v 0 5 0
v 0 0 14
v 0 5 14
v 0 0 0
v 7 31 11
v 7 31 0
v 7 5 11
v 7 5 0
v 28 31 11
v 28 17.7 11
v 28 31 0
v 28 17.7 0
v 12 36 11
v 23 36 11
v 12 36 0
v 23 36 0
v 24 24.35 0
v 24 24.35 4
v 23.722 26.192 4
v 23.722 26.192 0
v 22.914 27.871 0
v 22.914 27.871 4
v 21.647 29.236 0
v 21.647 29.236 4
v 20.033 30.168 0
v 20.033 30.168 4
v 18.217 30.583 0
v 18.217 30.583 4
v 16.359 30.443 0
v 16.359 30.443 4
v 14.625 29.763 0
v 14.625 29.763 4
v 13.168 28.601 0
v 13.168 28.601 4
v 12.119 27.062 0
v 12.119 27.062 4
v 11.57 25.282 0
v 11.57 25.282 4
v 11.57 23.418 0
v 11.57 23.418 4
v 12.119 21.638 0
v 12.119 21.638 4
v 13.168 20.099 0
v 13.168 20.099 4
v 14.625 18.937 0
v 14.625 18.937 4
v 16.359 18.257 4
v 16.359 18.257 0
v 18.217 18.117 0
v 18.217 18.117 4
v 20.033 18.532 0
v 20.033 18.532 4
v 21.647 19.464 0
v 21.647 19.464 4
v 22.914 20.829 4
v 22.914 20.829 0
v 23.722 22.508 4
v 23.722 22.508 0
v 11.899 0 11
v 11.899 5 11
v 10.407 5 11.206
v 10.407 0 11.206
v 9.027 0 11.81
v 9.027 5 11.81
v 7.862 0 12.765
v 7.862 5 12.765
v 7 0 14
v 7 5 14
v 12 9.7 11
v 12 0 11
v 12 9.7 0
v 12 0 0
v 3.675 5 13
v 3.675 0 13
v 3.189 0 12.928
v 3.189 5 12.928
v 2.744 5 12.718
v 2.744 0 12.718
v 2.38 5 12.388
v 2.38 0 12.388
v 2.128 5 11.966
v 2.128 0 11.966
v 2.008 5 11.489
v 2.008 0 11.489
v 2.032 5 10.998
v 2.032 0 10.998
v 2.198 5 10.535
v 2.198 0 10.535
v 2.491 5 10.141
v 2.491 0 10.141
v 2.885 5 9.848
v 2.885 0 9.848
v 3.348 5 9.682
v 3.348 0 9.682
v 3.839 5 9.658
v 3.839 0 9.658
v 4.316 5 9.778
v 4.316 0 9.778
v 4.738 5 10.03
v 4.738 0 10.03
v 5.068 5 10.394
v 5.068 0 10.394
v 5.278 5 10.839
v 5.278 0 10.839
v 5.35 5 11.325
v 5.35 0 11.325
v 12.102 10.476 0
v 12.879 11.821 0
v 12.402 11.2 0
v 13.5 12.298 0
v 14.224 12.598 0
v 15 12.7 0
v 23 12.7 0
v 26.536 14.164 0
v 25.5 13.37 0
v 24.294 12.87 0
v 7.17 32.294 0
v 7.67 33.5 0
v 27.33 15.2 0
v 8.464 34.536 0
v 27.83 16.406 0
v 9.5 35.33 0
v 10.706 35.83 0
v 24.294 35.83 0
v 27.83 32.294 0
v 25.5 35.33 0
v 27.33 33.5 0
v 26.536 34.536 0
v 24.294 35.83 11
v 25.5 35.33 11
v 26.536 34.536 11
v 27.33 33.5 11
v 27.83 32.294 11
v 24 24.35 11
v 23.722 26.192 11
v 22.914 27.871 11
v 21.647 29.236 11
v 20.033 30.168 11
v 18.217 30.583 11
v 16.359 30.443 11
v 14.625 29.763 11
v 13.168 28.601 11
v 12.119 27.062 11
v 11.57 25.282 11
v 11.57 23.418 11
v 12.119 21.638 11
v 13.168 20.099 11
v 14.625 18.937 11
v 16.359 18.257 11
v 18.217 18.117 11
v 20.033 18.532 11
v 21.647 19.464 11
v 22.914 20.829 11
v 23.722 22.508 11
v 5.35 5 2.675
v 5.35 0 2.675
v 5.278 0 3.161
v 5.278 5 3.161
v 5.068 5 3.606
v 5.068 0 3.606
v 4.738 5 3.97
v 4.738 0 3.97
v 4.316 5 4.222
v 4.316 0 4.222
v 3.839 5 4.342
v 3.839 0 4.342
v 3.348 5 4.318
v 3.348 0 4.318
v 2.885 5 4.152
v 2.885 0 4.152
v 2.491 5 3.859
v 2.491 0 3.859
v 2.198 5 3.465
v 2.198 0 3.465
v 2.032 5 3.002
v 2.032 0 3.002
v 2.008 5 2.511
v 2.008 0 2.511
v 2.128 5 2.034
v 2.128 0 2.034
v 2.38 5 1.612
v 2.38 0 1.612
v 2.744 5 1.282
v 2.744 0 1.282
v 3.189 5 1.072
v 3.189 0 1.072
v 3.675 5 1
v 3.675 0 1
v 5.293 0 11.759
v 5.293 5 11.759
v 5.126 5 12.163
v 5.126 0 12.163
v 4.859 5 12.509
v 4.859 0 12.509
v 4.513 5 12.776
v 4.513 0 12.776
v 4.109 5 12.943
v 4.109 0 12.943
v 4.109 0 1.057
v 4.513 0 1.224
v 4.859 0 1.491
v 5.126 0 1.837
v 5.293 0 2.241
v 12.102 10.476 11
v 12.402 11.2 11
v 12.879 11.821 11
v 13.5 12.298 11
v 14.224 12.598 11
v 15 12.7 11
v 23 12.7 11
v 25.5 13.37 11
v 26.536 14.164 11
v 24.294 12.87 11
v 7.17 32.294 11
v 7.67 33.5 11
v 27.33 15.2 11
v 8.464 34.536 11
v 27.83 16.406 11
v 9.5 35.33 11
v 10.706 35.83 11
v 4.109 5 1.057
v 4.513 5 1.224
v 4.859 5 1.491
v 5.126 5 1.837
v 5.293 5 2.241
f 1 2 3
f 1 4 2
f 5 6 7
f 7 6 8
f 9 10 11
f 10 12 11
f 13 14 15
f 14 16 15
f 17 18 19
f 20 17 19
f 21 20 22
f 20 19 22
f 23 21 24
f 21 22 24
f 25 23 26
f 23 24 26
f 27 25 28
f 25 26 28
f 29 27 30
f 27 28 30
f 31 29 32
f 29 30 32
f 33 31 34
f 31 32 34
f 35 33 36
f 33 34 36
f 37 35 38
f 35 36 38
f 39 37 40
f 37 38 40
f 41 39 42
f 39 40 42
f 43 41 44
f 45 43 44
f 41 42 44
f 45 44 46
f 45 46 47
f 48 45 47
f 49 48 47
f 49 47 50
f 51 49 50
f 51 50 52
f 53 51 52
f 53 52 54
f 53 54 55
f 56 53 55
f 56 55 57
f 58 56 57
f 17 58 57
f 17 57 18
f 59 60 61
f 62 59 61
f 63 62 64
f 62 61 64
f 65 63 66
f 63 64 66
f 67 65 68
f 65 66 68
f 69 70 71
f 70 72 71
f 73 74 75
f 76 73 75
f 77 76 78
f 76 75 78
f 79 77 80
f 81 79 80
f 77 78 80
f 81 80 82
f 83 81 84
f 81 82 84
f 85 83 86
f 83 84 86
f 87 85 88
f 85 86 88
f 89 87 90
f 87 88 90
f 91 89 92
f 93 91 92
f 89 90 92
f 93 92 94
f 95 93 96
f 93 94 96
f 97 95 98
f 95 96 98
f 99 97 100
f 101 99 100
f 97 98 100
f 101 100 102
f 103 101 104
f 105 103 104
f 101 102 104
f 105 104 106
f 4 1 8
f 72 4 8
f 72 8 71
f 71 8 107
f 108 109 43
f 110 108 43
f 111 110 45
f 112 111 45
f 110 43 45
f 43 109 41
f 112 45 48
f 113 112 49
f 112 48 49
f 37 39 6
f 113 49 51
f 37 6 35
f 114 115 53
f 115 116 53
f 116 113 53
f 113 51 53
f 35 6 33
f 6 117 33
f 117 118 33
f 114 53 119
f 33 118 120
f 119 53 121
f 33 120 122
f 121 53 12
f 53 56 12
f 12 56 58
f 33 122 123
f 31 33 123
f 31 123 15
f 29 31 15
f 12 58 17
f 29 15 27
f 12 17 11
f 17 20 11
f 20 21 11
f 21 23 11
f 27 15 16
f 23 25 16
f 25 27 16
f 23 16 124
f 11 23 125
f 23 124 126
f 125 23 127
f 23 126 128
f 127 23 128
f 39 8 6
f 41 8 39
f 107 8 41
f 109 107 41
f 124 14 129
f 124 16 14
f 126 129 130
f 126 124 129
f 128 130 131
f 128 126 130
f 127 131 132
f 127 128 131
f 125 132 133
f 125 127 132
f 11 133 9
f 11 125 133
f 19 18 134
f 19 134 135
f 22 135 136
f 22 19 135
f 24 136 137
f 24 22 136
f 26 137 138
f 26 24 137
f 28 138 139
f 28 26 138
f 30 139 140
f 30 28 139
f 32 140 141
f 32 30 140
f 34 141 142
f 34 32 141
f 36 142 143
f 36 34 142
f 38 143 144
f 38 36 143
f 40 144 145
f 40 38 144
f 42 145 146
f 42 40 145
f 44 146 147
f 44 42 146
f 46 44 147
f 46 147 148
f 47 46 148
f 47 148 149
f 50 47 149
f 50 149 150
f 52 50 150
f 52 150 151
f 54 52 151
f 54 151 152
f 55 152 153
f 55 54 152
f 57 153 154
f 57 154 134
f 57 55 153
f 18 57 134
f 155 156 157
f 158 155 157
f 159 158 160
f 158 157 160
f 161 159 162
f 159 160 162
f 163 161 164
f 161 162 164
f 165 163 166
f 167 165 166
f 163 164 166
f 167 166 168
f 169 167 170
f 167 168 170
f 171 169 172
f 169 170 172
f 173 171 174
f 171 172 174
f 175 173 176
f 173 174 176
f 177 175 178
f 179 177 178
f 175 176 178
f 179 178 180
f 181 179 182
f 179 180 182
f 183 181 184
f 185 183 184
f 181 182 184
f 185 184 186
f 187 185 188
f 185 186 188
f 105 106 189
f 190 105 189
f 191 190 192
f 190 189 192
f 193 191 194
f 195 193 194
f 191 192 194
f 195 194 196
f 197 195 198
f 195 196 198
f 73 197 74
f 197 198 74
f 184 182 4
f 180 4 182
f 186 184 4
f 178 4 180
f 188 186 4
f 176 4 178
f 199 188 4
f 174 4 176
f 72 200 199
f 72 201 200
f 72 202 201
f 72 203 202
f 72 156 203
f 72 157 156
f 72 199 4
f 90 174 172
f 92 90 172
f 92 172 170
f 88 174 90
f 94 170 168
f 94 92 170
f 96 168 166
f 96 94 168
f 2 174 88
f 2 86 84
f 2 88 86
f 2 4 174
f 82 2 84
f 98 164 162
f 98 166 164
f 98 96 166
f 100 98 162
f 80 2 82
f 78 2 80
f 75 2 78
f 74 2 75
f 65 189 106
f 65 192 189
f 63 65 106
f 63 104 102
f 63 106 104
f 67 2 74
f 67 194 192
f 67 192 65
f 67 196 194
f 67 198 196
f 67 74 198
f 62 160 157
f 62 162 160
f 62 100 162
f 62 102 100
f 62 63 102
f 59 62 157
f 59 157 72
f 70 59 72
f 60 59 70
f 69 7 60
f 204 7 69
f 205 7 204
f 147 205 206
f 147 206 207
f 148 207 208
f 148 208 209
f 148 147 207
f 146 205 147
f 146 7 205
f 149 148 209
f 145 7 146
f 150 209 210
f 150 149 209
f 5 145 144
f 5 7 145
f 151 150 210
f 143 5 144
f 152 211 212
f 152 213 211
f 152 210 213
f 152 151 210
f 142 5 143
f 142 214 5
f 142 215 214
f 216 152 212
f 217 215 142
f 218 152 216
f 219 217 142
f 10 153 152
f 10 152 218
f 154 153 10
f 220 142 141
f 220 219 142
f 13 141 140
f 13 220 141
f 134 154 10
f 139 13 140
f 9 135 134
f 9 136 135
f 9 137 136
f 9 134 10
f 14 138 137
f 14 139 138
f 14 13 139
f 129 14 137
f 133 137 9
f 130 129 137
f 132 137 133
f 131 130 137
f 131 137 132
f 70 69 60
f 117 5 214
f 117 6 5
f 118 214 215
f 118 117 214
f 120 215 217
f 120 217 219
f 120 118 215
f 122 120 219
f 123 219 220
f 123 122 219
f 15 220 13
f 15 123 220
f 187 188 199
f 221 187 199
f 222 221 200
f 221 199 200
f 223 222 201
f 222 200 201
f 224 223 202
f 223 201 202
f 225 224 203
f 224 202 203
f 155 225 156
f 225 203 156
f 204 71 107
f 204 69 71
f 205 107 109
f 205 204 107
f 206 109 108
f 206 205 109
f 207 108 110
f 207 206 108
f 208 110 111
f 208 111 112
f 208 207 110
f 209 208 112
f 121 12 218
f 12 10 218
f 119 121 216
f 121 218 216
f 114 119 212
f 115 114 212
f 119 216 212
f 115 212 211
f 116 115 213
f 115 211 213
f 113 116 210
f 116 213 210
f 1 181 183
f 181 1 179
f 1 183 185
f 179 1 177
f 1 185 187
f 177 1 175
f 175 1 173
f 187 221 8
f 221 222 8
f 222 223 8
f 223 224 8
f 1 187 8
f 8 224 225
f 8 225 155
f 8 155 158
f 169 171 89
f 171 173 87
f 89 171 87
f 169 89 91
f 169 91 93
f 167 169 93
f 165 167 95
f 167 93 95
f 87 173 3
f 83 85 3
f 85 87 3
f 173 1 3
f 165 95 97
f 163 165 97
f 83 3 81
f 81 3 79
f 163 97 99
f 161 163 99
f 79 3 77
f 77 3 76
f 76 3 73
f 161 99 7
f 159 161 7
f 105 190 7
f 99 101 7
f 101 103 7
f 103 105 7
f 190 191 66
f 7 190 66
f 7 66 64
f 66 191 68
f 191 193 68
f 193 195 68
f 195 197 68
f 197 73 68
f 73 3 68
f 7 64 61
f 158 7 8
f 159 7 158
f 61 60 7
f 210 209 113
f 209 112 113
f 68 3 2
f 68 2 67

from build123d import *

# Parameters (mm, degrees)
F0_W         = 28
F0_H         = 36
F1_DEPTH     = 4
F2_R         = 6.25
F2_W         = 7
F2_H         = 31
F2_W_2       = 16
F2_H_2       = 12.7
F3_DEPTH     = 25
F4_W         = 7
F4_H         = 5
F4_R         = 6.25
F5_DEPTH     = 7
F6_DEPTH     = 10
F8_DEPTH     = 25
F9_R         = 5
F10_R        = 3
F11_T1_DEPTH = 5


# Not quite as in the source:
# - a fillet or chamfer that OpenCascade refuses, or shapes differently, is made with other operations: its cross-section is extruded or revolved along the edge and cut away or added


with BuildPart() as f1:
    # F0 (on Top) → F1 (new body)
    with BuildSketch(Plane.XY):
        with Locations((14, 18)):
            Rectangle(F0_W, F0_H)
    extrude(amount=F1_DEPTH)

    # F2 (on face) → F3 (cut)
    with BuildSketch(Plane.XY.offset(4)):
        with Locations((17.75, 24.35)):
            Circle(F2_R)
        with Locations((3.5, 20.5)):
            Rectangle(F2_W, F2_H)
        with Locations((20, 6.35)):
            Rectangle(F2_W_2, F2_H_2)
    extrude(amount=-F3_DEPTH, mode=Mode.SUBTRACT)

    # F4 (on face) → F5 (join)
    with BuildSketch(Plane.XY.offset(4)):
        with Locations((3.5, 2.5)):
            Rectangle(F4_W, F4_H)
        Polygon((7, 36), (7, 5), (7, 0), (12, 0), (12, 12.7), (28, 12.7), (28, 36), align=None)
        with Locations((17.75, 24.35)):
            Circle(F4_R, mode=Mode.SUBTRACT)
    extrude(amount=F5_DEPTH)

    # F4 (on face) → F6 (join)
    with BuildSketch(Plane.XY.offset(4)):
        with Locations((3.5, 2.5)):
            Rectangle(F4_W, F4_H)
    extrude(amount=F6_DEPTH)

    # F7 (on face) → F8 (cut)
    with BuildSketch(Plane.XZ):
        with BuildLine():
            ThreePointArc((3.675, 13), (2.4905961415, 10.1405961415), (5.35, 11.325))
            ThreePointArc((5.35, 11.325), (4.8594038585, 12.5094038585), (3.675, 13))
        make_face()
        with BuildLine():
            ThreePointArc((3.675, 1), (4.8594038585, 1.4905961415), (5.35, 2.675))
            ThreePointArc((5.35, 2.675), (2.4905961415, 3.8594038585), (3.675, 1))
        make_face()
    extrude(amount=-F8_DEPTH, mode=Mode.SUBTRACT)

    # F9
    f9_edges = [f1.edges().sort_by_distance(p)[0] for p in [
        (28, 36, 5.5),
        (7, 36, 5.5),
        (28, 12.7, 5.5),
    ]]
    fillet(f9_edges, radius=F9_R)

    # F10
    f10_edges = [f1.edges().sort_by_distance(p)[0] for p in [
        (12, 12.7, 5.5),
    ]]
    fillet(f10_edges, radius=F10_R)

    # F11: fillet of radius 5.5 on 1 edges, made by hand

    # F11_s2 → F11_t1 (join)
    with BuildSketch(Plane.XZ.offset(-5)):
        with BuildLine():
            ThreePointArc((11.8989794856, 11), (9.0266981623, 11.8095842402), (7, 14))
            Line((7, 14), (7, 11))
            Line((7, 11), (11.8989794856, 11))
        make_face()
    extrude(amount=F11_T1_DEPTH)


solid = f1.part
